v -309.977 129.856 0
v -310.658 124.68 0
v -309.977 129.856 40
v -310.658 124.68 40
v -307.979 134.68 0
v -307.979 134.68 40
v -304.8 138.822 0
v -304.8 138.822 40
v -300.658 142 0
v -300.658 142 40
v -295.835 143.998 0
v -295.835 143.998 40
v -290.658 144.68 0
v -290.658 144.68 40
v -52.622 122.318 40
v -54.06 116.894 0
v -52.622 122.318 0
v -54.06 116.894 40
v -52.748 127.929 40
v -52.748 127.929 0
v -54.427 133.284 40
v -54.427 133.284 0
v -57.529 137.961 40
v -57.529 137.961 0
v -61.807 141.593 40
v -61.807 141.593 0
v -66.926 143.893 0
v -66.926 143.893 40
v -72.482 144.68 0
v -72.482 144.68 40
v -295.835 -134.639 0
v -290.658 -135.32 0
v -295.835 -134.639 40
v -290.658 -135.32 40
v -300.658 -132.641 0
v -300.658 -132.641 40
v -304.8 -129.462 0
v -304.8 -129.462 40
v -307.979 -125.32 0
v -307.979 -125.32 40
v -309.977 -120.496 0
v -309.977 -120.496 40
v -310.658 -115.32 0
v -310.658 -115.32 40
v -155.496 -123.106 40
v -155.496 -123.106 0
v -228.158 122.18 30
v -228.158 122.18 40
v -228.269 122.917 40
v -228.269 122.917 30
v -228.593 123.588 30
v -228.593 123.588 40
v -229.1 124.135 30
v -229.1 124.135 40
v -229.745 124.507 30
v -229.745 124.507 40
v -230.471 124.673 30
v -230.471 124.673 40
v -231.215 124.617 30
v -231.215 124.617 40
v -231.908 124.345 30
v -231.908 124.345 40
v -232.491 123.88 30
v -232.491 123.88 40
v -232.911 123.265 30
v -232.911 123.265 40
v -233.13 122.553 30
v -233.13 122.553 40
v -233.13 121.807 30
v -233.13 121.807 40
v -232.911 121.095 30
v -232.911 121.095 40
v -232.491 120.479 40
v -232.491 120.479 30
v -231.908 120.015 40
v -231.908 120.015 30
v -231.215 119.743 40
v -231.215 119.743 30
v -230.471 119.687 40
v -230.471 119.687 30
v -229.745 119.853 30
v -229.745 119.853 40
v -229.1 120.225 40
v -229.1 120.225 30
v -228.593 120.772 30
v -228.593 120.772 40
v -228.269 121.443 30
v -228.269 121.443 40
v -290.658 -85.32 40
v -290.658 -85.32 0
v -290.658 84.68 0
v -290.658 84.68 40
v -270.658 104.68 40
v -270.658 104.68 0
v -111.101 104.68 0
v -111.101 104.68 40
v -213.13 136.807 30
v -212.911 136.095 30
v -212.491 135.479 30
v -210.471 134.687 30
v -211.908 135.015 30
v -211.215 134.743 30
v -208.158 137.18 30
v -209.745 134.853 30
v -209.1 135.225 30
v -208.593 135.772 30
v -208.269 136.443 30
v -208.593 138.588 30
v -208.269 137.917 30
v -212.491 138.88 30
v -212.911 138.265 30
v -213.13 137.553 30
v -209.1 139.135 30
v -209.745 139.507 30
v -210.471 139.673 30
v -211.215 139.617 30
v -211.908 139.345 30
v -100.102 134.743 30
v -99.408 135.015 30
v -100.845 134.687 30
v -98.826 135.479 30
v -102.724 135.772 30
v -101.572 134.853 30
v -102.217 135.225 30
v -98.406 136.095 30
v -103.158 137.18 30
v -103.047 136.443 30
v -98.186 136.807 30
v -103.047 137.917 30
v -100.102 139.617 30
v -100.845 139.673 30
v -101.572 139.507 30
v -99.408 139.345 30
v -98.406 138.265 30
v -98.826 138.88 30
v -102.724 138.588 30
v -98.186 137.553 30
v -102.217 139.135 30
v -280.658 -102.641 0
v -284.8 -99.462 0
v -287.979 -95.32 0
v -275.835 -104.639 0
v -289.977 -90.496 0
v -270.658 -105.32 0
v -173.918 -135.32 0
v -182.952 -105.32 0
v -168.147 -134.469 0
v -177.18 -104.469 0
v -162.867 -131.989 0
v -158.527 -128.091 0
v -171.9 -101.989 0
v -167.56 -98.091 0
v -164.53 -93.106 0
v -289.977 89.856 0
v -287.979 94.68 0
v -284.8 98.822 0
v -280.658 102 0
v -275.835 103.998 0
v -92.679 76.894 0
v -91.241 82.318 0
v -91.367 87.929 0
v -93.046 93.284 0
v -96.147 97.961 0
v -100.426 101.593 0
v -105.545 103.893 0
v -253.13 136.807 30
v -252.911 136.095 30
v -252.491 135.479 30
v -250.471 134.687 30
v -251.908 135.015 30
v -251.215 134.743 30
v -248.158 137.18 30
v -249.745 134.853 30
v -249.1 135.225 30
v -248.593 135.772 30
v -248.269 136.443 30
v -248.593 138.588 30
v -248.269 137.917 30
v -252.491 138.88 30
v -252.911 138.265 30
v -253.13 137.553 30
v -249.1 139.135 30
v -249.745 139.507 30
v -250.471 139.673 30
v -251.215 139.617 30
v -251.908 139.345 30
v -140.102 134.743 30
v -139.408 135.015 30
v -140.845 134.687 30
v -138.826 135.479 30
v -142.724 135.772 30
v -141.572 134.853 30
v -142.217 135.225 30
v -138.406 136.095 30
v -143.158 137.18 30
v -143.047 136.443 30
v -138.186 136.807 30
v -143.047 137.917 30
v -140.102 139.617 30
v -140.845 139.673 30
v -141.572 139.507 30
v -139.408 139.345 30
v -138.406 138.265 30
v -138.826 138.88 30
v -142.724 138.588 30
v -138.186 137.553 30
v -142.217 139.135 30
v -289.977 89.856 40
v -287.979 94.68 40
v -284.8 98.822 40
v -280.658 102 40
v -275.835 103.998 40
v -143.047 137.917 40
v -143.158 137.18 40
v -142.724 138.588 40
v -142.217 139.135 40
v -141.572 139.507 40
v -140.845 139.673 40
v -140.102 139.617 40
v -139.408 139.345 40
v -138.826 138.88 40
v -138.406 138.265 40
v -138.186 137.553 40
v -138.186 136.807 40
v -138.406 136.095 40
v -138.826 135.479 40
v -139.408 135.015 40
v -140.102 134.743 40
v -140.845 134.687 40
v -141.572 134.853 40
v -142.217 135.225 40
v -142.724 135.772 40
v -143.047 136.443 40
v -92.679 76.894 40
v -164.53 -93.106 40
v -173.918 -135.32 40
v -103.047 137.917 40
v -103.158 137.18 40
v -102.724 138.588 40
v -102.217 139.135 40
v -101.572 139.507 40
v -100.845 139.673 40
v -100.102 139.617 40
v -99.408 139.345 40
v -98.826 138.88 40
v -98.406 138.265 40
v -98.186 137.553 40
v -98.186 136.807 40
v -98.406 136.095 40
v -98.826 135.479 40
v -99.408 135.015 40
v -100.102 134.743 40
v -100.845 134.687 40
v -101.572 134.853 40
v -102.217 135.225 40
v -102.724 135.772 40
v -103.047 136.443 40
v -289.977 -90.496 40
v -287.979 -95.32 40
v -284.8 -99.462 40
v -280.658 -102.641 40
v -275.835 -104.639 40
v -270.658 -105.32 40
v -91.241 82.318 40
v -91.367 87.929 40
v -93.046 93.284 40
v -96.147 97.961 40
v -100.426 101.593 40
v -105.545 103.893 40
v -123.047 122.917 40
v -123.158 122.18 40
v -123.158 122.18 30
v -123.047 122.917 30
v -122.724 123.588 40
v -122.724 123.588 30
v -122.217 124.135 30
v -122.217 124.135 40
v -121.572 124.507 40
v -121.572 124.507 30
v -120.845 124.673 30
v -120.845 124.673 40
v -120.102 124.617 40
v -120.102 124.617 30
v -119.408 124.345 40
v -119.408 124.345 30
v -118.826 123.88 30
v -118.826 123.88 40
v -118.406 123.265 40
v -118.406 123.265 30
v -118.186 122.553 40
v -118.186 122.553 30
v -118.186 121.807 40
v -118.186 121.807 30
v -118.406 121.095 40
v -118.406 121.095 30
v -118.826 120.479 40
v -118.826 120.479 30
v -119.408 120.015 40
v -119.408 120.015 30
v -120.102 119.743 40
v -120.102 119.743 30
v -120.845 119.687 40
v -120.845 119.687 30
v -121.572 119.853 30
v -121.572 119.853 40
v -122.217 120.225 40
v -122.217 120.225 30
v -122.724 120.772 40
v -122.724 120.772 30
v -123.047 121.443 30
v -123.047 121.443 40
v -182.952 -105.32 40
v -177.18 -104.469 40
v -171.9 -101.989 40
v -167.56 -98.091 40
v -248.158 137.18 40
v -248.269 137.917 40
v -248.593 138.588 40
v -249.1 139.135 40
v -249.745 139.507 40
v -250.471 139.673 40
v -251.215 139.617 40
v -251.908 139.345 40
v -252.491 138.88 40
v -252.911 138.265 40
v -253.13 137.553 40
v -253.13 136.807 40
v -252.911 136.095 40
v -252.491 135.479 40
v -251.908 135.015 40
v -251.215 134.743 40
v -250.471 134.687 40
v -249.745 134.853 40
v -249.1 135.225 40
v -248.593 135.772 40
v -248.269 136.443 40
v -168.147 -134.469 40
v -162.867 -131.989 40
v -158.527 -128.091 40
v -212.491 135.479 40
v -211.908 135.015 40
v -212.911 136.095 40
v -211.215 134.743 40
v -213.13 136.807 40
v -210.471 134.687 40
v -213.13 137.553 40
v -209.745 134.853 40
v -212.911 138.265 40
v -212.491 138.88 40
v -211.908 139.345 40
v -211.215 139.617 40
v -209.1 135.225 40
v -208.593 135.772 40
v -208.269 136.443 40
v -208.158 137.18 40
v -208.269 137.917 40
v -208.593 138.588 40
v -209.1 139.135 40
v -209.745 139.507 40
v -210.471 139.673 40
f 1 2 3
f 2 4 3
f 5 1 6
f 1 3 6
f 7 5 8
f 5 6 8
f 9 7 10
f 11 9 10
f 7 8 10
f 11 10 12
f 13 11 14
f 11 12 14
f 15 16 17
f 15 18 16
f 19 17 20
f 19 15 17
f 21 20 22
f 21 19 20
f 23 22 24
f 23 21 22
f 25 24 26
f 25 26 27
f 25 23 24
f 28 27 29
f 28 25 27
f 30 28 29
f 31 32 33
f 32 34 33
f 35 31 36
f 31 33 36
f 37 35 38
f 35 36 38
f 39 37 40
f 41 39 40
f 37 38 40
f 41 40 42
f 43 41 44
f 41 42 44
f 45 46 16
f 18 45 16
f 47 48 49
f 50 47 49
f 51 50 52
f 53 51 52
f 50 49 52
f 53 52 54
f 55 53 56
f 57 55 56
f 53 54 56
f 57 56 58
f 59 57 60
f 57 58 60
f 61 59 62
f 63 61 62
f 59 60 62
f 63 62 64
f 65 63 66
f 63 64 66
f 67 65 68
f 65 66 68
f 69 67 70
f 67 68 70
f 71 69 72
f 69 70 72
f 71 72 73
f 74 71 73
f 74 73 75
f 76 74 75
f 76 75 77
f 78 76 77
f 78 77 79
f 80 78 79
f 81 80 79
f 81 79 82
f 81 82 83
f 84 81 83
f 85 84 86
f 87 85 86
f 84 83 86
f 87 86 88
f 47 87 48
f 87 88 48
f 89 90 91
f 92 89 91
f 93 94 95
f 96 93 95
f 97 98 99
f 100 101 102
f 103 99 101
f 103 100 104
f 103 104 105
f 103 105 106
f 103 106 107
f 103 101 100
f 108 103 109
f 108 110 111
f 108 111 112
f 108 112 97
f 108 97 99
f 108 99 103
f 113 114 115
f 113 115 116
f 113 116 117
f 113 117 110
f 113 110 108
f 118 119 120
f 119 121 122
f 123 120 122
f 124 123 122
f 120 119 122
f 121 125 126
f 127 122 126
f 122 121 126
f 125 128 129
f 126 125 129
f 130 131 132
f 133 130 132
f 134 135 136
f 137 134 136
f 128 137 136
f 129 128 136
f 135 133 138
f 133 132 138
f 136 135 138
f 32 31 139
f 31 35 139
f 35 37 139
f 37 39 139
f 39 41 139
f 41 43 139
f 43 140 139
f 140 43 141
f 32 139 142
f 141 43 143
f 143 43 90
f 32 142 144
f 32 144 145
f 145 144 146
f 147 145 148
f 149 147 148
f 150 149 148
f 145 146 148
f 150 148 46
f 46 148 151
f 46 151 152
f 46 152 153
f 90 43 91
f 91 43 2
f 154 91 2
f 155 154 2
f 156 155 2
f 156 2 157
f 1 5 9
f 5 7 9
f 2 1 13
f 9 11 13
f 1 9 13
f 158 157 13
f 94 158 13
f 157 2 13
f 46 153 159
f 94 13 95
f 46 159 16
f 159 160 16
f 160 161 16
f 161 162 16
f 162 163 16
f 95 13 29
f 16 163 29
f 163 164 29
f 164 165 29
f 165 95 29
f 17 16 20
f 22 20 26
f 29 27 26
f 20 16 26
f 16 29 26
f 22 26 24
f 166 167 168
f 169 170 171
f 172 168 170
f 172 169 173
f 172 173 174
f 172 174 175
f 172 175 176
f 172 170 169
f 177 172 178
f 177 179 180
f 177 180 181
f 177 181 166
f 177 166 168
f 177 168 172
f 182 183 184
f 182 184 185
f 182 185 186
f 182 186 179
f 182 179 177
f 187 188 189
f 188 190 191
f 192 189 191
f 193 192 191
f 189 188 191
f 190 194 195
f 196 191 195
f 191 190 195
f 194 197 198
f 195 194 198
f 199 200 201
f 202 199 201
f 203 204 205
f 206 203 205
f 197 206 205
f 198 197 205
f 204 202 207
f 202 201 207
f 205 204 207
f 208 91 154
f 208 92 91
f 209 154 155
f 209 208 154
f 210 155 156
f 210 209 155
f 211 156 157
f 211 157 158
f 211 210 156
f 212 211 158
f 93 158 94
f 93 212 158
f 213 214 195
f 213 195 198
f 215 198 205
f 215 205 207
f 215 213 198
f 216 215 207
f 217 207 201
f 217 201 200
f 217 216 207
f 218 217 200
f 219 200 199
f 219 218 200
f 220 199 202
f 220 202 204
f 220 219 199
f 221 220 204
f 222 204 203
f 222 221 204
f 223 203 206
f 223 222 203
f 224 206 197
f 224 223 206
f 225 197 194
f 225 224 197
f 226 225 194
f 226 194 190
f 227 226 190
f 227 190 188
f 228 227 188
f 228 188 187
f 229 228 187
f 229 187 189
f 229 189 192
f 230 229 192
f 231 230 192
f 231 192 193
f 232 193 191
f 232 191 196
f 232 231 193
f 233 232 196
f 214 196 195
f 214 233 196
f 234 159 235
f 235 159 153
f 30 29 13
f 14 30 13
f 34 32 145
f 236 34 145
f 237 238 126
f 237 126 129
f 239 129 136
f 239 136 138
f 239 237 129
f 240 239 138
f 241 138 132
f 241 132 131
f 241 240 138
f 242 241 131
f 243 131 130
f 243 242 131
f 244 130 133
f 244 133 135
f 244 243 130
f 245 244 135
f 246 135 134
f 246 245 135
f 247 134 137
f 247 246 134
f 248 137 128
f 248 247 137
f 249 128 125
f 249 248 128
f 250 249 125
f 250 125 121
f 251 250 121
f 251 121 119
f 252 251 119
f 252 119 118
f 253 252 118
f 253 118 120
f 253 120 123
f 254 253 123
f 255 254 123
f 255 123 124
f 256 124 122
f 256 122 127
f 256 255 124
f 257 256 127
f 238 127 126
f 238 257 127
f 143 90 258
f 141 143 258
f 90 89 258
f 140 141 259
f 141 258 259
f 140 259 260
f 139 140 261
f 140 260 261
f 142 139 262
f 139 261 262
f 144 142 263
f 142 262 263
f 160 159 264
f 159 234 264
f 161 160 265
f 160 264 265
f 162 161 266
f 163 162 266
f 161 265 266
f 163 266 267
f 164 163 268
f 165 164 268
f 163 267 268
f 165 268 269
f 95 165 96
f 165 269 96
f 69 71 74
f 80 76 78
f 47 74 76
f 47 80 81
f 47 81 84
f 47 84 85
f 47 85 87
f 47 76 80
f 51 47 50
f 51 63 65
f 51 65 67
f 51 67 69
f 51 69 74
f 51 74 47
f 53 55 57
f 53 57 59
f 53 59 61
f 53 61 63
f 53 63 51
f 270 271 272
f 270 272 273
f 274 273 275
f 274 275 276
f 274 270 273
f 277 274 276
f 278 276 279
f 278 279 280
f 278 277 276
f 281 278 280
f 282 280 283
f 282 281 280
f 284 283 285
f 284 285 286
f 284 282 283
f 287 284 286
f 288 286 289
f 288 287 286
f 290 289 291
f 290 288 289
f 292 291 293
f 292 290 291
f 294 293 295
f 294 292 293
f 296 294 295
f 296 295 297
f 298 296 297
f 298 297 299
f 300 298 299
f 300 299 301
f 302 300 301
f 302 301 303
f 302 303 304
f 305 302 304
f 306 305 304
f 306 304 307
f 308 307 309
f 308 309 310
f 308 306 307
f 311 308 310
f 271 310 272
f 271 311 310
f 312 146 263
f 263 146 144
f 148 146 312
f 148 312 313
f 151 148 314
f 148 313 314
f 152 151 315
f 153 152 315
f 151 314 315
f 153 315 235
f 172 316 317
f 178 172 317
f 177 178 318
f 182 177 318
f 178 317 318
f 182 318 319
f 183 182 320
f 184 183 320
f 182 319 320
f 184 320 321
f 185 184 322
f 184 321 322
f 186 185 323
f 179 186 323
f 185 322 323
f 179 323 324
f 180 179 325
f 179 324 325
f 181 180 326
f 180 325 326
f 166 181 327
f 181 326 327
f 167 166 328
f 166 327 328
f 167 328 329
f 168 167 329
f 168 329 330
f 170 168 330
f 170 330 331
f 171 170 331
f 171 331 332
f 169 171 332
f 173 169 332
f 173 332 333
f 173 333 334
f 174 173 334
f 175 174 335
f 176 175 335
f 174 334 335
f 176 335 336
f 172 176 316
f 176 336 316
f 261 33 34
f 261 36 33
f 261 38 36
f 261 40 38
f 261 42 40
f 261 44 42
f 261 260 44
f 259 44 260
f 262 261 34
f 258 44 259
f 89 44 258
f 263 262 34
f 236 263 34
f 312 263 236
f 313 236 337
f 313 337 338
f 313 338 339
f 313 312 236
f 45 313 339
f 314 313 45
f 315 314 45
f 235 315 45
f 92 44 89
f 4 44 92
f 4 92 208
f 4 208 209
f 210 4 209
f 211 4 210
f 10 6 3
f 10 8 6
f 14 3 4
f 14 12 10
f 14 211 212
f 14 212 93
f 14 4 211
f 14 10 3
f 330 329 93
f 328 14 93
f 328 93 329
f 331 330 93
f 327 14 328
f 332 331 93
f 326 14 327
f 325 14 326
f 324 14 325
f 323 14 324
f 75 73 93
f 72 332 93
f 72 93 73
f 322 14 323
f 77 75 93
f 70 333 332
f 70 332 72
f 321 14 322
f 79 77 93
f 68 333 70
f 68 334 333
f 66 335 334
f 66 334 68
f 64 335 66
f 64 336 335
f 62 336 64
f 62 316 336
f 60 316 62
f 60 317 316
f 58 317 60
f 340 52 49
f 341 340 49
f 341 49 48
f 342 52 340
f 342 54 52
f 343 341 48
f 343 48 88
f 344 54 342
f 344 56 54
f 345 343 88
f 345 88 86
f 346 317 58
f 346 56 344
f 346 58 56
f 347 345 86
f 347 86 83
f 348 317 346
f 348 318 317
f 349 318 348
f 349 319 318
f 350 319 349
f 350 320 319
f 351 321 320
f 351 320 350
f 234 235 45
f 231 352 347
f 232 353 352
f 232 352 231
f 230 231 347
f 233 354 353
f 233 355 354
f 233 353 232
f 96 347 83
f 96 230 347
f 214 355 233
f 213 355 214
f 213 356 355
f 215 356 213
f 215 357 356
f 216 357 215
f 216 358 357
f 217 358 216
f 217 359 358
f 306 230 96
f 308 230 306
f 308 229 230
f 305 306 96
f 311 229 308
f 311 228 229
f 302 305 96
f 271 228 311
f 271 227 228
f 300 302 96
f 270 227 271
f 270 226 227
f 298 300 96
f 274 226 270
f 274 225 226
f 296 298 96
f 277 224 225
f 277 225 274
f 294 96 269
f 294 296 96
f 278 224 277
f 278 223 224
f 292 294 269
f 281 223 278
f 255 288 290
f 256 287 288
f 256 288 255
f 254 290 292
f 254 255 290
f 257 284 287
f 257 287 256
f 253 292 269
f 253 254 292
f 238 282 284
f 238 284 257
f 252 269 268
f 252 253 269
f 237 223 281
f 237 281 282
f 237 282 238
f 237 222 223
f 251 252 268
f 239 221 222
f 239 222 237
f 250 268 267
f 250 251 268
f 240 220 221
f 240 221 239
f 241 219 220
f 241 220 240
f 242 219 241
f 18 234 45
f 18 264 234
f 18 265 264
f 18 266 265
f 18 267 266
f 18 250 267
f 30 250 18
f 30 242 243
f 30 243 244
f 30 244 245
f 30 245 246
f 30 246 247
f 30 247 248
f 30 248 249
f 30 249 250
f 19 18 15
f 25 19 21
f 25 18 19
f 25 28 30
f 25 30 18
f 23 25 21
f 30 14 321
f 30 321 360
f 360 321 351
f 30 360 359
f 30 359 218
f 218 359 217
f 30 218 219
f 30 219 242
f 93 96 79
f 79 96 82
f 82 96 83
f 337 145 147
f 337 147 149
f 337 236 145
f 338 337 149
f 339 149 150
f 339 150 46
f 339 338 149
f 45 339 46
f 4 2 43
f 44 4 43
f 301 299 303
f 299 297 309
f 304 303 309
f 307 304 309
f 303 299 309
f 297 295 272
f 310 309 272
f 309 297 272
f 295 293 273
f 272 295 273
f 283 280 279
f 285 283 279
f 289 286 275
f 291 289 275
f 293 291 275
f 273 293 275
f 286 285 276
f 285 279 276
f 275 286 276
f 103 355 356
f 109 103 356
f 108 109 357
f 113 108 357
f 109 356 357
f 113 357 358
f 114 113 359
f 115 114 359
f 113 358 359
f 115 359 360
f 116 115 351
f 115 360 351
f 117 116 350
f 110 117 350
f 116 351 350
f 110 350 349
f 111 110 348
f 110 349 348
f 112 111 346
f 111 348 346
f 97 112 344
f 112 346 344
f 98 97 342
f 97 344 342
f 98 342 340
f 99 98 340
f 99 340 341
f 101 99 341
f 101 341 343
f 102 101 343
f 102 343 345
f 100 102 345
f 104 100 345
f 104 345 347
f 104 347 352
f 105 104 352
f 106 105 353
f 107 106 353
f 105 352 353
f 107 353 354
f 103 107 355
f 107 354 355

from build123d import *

# Parameters (mm, degrees)
BOSS_EXTRUDE2_DEPTH = 40
FILLET3_R           = 20
SKETCH2_R           = 2.5
CUT_EXTRUDE1_DEPTH  = 10


with BuildPart() as part:
    # Sketch1 → Boss-Extrude2 (new body)
    with BuildSketch(Plane.XY):
        Polygon((-310.658255987, -135.320069059), (-160.658255987, -135.320069059), (-42.316331357, 144.679930941), (-310.658255987, 144.679930941), align=None)
        Polygon((-290.658255987, 104.679930941), (-80.935291782, 104.679930941), (-169.691735254, -105.320069059), (-290.658255987, -105.320069059), align=None, mode=Mode.SUBTRACT)
    extrude(amount=BOSS_EXTRUDE2_DEPTH)

    # Fillet3
    fillet3_edges = [part.edges().sort_by_distance(p)[0] for p in [
        (-80.935291782, 104.679930941, 20),
        (-290.658255987, 104.679930941, 20),
        (-290.658255987, -105.320069059, 20),
        (-169.691735254, -105.320069059, 20),
        (-42.316331357, 144.679930941, 20),
        (-160.658255987, -135.320069059, 20),
        (-310.658255987, -135.320069059, 20),
        (-310.658255987, 144.679930941, 20),
    ]]
    fillet(fillet3_edges, radius=FILLET3_R)

    # Sketch2 → Cut-Extrude1 (cut)
    with BuildSketch(Plane.XY.offset(40)):
        with Locations((-250.658255987, 137.179930941)):
            Circle(SKETCH2_R)
        with Locations((-210.658255987, 137.179930941)):
            Circle(SKETCH2_R)
        with Locations((-230.658255987, 122.179930941)):
            Circle(SKETCH2_R)
    cut_extrude1 = extrude(amount=-CUT_EXTRUDE1_DEPTH, mode=Mode.SUBTRACT)

    # Mirror1: Cut-Extrude1 across plane
    add(cut_extrude1.mirror(Plane.ZY.offset(175.658255987)), mode=Mode.SUBTRACT)


solid = part.part
